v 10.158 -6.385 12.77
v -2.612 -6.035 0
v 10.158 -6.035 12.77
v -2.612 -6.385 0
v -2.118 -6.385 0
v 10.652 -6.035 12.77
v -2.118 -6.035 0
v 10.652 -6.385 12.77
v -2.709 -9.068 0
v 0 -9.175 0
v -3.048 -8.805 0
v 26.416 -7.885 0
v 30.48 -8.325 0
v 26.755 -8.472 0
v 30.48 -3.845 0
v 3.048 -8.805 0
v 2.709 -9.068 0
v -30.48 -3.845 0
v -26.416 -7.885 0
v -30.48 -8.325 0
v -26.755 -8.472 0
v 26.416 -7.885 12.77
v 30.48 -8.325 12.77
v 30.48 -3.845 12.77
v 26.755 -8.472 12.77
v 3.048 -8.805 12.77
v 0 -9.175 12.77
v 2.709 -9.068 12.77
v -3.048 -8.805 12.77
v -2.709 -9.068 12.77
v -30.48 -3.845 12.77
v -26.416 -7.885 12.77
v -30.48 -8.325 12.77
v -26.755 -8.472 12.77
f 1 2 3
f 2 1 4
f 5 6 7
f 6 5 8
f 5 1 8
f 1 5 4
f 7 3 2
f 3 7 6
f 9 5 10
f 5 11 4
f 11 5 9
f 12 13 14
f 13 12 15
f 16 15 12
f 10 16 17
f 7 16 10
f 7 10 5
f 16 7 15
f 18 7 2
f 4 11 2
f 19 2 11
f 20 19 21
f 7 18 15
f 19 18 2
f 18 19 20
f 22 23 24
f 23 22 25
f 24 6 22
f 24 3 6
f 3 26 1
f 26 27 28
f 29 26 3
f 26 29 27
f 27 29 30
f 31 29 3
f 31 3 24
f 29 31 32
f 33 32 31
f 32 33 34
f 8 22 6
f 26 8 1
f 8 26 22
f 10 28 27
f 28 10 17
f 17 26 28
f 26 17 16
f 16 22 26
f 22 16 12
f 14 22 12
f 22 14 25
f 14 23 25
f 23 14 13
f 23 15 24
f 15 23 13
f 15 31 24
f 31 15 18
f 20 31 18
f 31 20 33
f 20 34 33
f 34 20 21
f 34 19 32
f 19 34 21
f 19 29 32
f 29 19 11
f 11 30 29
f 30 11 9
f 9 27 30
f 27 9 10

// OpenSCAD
// Long thin strip with shallow saddle (V) along length + subtle end steps + mid seam
// Bounding box target: 61.0 x 12.8 x 5.1 mm

L = 60.96;          // X length
W = 12.77;          // Y width
H = 5.08;           // Z overall height (top is flat)

v_depth = 1.20;       // ends are higher (bottom closer to top) by this amount vs center
end_step_len = 4.0;   // shoulder length at each end
end_step_drop = 0.60; // extra thickness at ends (bottom lower) by this amount

mid_seam_len = 6.0;   // subtle mid transition length
mid_seam_drop = 0.25; // extra thickness at mid (bottom lower) by this amount

overlap = 0.20;
$fn = 64;

// --- Profiles along X (length) ---
function saddle_raise(x) =
    v_depth * (abs(x) / (L/2)); // 0 at center, v_depth at ends (linear "V")

function end_drop(x) =
    (abs(x) >= (L/2 - end_step_len)) ? end_step_drop : 0;

function mid_drop(x) =
    (abs(x) <= (mid_seam_len/2)) ? mid_seam_drop : 0;

// Bottom Z at given x (top is fixed at +H/2)
function bottom_z(x) =
    (-H/2) + saddle_raise(x) - end_drop(x) - mid_drop(x);

// Build watertight solid by extruding an XZ polygon along Y (width).
module strip_solid() {
    n = 180;
    dx = L / n;

    pts_top = [ for (i = [0:n]) [ -L/2 + i*dx,  H/2 ] ];
    pts_bot = [ for (i = [n:-1:0]) [ -L/2 + i*dx, bottom_z(-L/2 + i*dx) ] ];
    pts = concat(pts_top, pts_bot);

    // Correct orientation: polygon in XZ, extrude along Y, centered about Y=0.
    translate([0, -W/2, 0])
        linear_extrude(height=W, center=false, convexity=10)
            polygon(points=pts);
}

// Small chamfers on the long top edges (kept subtle).
module edge_soften() {
    cham = 0.35;
    difference() {
        children();

        // Remove tiny wedges along the two long top edges
        for (sy = [-1, 1]) {
            translate([0, sy*(W/2 - cham/2), H/2 - cham/2])
                rotate([0, 45*sy, 0])  // slight bevel feel without changing overall size much
                    cube([L + 2*overlap, cham, cham], center=true);
        }
    }
}

module final_model() {
    edge_soften()
        strip_solid();
}

final_model();
